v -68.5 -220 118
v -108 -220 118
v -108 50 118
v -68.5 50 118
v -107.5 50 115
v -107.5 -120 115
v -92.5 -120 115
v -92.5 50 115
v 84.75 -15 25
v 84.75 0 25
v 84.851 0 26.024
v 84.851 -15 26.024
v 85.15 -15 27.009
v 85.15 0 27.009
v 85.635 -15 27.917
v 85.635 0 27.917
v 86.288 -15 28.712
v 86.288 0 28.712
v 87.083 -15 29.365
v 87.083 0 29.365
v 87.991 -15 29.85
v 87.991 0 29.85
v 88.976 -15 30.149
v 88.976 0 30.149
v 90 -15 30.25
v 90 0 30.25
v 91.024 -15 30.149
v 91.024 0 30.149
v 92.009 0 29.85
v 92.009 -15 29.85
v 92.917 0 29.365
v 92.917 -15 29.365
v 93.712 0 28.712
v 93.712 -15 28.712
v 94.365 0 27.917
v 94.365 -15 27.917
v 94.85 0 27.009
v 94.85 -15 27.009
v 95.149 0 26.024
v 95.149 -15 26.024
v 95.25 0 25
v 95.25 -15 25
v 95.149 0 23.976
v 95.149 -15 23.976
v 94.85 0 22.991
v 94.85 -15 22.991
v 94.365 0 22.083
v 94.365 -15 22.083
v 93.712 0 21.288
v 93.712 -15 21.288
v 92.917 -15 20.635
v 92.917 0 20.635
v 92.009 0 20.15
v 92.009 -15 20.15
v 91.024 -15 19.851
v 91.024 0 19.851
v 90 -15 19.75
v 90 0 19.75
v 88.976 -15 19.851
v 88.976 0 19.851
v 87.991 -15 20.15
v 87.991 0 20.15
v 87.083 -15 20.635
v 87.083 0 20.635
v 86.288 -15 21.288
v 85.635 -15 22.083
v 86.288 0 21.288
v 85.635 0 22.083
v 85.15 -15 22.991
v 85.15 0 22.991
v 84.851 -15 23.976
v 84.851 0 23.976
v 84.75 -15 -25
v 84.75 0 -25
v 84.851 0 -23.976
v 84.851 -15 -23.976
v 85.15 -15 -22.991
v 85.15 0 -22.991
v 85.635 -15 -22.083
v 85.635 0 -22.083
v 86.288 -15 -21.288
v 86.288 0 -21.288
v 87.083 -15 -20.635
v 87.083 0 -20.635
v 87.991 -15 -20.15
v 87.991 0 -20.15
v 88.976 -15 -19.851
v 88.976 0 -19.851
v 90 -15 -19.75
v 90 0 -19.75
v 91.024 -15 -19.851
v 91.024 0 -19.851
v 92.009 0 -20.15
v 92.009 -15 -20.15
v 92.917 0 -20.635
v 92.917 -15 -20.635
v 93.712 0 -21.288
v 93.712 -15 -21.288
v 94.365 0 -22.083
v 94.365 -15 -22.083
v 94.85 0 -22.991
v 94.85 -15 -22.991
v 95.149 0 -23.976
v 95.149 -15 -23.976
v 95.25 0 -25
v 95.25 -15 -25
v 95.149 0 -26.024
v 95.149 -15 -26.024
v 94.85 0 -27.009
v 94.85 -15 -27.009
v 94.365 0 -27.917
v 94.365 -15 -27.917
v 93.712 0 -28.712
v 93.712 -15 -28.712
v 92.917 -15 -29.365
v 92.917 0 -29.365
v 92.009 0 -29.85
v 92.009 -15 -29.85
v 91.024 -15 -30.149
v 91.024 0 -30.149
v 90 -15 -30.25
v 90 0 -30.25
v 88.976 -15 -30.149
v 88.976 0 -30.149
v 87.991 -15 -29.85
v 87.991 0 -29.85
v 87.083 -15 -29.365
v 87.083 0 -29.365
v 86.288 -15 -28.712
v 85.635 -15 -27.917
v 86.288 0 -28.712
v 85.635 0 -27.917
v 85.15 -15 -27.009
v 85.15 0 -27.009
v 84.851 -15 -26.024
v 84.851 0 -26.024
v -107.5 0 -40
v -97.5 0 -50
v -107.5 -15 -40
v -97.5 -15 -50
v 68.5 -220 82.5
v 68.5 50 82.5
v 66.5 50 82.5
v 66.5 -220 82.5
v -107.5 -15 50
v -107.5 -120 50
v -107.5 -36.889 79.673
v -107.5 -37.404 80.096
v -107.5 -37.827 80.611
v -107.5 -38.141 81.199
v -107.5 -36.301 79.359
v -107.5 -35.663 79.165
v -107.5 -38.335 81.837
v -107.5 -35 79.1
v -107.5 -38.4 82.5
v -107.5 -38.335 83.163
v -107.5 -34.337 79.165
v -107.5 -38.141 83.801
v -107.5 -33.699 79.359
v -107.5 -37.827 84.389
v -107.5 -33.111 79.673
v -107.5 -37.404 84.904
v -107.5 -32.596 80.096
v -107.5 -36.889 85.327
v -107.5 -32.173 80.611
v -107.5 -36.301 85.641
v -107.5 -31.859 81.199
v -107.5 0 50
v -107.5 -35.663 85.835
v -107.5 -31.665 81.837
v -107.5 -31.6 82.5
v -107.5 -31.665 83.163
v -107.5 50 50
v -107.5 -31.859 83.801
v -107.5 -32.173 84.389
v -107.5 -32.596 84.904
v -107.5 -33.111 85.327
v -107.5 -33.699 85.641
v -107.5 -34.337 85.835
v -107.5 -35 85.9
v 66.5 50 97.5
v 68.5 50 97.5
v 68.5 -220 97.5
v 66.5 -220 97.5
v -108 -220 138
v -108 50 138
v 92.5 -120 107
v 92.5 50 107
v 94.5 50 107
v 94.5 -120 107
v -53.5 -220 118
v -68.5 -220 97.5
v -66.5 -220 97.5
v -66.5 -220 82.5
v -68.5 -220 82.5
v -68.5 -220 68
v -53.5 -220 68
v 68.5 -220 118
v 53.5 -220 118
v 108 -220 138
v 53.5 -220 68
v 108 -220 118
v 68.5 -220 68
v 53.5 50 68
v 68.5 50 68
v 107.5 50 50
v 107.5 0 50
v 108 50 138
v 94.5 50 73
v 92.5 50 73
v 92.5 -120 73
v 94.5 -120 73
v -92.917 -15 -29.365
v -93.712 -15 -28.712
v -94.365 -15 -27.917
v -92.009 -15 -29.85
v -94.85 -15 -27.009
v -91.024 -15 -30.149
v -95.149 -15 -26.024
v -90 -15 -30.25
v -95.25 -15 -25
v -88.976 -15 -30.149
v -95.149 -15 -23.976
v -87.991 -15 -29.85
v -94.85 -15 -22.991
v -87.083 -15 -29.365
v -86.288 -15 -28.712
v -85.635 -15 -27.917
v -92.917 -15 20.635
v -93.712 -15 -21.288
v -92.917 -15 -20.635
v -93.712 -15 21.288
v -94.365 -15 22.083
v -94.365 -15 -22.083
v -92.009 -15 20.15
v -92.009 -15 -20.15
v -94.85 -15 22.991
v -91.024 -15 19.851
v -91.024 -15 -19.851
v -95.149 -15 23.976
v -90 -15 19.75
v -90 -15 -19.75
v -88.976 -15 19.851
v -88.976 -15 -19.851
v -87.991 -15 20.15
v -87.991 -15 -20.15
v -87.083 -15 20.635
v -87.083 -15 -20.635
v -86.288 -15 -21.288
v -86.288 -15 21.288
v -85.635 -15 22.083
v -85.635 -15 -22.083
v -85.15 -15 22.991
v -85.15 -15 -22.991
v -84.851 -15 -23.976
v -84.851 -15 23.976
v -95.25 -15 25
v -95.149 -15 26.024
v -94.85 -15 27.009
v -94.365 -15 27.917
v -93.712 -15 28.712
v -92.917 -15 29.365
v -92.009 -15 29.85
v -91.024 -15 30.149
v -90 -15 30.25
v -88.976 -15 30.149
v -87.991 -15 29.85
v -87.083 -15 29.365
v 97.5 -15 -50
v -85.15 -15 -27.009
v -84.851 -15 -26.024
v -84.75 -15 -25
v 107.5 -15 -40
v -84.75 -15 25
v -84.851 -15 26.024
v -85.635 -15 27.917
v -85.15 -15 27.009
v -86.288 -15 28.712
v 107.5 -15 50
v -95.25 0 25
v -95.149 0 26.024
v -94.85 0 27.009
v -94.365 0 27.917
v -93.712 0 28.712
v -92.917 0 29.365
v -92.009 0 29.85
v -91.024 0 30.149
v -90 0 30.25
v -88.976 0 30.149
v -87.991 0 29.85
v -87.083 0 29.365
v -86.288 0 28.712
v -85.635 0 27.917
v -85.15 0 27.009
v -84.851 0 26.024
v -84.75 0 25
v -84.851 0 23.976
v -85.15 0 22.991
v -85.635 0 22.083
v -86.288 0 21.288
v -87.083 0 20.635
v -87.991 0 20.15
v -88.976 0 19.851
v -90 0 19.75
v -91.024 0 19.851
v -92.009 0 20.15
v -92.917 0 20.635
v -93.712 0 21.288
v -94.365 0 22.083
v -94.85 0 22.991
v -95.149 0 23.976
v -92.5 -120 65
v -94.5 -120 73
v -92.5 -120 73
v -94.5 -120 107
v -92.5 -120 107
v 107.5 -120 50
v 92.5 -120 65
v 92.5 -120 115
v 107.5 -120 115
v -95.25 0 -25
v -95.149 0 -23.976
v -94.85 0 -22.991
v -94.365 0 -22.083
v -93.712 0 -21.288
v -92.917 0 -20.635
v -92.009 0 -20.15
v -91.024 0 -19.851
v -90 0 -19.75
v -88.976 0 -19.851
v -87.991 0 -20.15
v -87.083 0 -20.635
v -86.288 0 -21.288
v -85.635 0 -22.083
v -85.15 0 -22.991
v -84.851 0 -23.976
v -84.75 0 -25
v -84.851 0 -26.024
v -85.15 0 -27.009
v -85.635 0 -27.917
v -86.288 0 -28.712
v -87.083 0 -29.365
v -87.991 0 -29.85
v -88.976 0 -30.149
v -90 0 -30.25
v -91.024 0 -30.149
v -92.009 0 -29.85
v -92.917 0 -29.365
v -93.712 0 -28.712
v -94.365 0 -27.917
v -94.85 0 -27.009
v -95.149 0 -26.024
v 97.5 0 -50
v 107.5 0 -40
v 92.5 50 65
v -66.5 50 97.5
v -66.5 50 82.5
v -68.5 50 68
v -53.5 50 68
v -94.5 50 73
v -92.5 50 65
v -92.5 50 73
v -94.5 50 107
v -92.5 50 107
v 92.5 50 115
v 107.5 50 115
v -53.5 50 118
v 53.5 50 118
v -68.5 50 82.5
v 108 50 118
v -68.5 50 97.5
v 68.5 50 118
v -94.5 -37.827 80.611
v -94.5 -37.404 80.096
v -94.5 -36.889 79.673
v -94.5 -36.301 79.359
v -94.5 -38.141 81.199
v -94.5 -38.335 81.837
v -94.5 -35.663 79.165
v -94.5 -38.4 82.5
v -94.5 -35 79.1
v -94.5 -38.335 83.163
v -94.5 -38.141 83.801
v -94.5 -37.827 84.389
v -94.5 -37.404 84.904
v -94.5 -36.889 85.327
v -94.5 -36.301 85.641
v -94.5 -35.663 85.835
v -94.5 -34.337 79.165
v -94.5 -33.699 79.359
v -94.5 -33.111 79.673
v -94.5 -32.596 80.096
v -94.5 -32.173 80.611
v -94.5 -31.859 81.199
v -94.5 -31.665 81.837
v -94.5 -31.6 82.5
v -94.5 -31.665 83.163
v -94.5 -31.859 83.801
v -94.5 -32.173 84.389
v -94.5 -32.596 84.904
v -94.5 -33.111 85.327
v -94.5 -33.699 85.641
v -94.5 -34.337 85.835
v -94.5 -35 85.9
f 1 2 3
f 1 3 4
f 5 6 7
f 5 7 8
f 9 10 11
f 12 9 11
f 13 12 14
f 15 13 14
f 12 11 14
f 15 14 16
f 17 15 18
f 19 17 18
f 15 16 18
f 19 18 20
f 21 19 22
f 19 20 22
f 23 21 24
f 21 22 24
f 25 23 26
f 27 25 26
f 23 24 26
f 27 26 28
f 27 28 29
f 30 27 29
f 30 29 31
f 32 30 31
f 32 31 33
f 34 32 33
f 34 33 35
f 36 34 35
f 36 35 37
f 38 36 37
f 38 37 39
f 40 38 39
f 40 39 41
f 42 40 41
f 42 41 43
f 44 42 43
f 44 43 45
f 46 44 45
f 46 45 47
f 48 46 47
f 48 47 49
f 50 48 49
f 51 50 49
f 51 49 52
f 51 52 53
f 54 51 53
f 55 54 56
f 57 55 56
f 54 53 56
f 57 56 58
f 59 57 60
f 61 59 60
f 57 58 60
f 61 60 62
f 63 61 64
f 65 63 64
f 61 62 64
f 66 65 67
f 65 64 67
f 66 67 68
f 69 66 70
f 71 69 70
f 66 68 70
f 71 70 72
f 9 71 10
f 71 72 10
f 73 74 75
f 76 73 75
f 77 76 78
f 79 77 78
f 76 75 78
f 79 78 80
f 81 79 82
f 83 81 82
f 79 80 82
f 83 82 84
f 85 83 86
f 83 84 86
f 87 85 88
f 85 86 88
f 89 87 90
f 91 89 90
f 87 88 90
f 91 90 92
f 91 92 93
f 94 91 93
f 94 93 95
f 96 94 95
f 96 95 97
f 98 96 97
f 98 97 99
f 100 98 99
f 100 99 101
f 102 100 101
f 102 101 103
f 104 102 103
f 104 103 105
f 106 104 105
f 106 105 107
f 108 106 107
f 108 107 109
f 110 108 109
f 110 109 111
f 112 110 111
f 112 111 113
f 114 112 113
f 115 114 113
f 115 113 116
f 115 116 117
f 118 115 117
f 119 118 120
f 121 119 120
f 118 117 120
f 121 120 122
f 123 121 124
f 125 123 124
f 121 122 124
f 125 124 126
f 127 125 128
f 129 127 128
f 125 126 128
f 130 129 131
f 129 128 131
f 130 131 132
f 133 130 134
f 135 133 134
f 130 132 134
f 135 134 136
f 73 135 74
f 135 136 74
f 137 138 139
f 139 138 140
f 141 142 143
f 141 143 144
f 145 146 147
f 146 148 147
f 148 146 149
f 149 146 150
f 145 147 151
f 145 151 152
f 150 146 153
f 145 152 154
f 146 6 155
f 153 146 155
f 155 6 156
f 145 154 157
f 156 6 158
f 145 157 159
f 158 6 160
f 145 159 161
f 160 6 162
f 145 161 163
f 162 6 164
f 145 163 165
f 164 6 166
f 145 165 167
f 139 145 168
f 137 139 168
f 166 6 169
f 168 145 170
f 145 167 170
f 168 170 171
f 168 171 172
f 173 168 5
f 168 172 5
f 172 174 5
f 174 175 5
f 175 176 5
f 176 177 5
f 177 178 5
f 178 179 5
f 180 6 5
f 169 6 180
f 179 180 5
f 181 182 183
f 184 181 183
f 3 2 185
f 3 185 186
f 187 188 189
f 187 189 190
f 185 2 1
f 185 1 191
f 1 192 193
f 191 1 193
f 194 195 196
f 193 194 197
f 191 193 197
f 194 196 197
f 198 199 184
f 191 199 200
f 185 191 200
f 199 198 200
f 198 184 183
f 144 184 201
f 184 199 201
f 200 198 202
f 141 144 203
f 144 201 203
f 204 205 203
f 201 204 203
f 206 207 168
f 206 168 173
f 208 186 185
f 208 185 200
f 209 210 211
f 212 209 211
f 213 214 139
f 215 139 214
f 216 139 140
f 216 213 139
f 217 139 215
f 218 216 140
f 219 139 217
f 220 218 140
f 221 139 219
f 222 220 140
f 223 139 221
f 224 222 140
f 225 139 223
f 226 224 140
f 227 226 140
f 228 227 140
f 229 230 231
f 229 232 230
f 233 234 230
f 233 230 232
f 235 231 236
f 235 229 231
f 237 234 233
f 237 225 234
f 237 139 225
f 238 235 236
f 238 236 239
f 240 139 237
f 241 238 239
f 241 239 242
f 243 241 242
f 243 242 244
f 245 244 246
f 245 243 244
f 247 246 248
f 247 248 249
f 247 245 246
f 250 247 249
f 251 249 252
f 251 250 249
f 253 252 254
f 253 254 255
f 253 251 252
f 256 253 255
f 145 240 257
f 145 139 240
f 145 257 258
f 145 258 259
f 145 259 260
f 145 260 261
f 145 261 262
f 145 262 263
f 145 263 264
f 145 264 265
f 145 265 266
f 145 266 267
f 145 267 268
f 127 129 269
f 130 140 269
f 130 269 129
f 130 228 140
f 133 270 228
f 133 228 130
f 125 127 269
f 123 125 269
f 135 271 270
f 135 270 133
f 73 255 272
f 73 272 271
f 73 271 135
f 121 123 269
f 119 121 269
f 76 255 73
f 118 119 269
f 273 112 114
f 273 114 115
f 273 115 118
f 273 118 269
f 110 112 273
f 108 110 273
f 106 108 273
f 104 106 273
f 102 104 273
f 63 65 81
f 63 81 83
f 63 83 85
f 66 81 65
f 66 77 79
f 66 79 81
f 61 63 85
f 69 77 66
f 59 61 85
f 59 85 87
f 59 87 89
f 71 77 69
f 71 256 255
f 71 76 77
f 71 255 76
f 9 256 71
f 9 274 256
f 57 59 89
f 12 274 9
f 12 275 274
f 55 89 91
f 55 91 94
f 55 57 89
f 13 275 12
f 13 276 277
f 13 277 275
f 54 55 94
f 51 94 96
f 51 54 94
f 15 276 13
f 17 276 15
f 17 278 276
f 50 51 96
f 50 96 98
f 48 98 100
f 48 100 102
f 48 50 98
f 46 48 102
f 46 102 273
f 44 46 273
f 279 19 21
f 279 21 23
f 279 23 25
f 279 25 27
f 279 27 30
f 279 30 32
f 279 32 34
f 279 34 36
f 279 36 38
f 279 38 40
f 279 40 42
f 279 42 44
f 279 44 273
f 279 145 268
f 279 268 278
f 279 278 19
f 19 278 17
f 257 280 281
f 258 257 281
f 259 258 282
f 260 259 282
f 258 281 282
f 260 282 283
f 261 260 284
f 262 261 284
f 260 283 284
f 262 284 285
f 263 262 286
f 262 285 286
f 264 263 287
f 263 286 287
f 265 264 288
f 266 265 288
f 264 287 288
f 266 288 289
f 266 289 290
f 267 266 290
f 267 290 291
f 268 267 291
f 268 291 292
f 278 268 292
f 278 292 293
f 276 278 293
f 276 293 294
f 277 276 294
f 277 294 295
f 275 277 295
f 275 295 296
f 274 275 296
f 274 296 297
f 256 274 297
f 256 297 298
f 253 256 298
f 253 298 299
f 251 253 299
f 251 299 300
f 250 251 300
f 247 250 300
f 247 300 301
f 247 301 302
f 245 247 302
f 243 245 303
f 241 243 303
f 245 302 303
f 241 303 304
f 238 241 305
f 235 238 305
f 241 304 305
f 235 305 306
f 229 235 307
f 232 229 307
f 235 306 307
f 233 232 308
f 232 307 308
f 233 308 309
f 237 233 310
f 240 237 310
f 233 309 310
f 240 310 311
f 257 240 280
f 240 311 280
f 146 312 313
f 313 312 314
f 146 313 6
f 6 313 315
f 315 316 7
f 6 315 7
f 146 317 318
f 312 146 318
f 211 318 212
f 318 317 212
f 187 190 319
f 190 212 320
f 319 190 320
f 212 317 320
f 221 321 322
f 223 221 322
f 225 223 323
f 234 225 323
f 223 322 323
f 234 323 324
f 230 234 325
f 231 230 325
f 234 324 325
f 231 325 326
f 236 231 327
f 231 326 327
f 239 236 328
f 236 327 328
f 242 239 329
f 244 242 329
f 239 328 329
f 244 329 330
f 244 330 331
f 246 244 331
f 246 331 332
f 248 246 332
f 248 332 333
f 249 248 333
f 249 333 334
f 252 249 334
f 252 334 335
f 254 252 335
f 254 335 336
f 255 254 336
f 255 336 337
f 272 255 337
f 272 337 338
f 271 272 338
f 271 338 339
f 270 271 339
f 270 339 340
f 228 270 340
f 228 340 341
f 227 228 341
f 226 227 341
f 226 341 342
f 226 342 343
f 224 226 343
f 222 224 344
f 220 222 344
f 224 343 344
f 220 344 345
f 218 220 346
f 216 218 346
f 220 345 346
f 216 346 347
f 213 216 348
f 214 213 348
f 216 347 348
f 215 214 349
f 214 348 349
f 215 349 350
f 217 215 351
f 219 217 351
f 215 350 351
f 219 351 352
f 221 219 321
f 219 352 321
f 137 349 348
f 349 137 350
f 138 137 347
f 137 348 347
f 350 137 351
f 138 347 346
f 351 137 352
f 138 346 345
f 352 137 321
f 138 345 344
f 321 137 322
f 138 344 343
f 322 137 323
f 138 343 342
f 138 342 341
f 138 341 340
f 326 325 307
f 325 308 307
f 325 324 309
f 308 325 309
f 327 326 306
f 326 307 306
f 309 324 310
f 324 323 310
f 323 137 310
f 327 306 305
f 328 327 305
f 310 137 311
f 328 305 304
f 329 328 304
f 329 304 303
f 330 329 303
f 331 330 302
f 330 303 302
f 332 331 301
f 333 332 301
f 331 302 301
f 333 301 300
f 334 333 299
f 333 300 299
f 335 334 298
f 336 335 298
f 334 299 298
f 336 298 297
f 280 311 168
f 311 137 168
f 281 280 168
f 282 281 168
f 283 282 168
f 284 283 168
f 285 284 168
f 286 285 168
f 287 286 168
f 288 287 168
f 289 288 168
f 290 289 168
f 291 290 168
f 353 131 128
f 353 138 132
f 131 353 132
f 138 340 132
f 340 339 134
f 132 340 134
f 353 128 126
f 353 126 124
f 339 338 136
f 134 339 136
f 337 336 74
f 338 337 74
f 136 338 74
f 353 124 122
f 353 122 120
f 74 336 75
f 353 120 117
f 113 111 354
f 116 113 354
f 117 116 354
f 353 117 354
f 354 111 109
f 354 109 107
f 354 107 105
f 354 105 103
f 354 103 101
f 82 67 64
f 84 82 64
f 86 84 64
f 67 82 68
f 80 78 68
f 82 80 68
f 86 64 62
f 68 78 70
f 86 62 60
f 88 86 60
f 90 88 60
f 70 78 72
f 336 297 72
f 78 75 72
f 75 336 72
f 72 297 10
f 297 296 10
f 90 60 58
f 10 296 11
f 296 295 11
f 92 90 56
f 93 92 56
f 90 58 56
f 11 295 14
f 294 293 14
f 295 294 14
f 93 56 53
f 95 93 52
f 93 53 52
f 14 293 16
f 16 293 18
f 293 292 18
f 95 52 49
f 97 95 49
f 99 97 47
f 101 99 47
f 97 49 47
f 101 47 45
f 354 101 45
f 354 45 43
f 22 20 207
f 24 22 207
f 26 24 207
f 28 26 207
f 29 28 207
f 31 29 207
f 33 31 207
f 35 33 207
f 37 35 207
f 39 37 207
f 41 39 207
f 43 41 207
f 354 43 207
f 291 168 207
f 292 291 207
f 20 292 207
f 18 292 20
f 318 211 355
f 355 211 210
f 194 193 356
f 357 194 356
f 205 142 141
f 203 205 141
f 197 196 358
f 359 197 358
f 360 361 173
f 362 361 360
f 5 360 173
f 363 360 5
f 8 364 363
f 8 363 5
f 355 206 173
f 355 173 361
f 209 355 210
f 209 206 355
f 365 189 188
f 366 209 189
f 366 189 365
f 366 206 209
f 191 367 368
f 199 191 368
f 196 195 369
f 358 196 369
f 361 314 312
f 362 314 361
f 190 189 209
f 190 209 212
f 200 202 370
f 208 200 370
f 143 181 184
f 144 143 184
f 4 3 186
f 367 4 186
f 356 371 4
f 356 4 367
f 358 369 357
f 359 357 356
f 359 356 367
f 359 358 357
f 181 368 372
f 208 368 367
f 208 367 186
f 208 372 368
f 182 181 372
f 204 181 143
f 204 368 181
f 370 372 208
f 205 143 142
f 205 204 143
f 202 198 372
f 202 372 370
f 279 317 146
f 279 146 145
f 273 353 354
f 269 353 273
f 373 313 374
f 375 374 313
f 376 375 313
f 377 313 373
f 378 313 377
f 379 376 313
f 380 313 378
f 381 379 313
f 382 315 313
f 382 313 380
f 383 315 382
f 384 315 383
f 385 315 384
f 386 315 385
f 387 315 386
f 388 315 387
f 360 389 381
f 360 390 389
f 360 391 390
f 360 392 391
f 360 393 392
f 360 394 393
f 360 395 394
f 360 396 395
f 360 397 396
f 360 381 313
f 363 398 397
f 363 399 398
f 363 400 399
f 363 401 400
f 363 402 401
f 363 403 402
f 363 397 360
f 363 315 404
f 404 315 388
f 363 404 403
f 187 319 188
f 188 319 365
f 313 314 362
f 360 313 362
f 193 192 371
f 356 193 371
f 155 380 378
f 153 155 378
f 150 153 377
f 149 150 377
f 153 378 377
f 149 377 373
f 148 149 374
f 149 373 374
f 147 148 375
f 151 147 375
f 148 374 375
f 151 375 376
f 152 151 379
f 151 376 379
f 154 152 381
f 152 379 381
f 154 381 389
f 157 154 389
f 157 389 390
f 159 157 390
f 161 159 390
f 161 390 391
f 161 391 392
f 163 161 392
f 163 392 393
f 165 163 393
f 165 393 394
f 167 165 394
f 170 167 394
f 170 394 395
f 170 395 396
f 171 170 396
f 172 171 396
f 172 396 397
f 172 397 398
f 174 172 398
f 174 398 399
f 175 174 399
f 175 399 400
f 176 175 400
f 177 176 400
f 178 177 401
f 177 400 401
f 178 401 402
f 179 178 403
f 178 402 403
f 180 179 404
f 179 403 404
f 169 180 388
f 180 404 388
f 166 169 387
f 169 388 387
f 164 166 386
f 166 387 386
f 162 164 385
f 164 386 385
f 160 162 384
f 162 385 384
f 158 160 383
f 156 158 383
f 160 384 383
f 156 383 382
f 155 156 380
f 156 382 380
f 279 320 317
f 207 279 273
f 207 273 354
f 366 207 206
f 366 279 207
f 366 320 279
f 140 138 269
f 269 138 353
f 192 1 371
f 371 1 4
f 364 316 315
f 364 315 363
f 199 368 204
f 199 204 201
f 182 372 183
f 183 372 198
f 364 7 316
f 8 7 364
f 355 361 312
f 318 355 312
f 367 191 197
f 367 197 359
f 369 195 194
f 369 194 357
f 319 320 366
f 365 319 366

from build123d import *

# Parameters (mm, degrees)
F0_W      = 215
F0_H      = 100
F3_DEPTH  = 15
F4_DEPTH  = 215
F5_W      = 170
F5_H      = 50
F6_DEPTH  = 15
F8_W      = 170
F8_H      = 65
F9_DEPTH  = 15
F10_W     = 170
F10_H     = 34
F12_DEPTH = 2
F11_W     = 170
F11_H     = 34
F13_DEPTH = 2
F15_D     = 10.5
F16_SIZE  = 10
F18_W     = 216
F18_H     = 270
F19_DEPTH = 20
F22_W     = 270
F22_H     = 50
F24_DEPTH = 15
F23_W     = 270
F23_H     = 50
F25_DEPTH = 15
F26_W     = 270
F26_H     = 15
F28_DEPTH = 2
F27_W     = 270
F27_H     = 15
F29_DEPTH = 2
F31_D     = 6.8
F31_DEPTH = 25
F31_TIP   = 2.0429261047


with BuildPart() as f3:
    # F0 (on Front) → F3 (new body)
    with BuildSketch(Plane.XZ):
        Rectangle(F0_W, F0_H)
    extrude(amount=F3_DEPTH)

    # F2 (on offset) → F4 (join)
    with BuildSketch(Plane.YZ.offset(107.5)):
        Polygon((50, 65), (0, 65), (-120, 65), (-120, 50), (50, 50), align=None)
    extrude(amount=-F4_DEPTH)

    # F5 (on offset) → F6 (join)
    with BuildSketch(Plane.YZ.offset(107.5)):
        with Locations((-35, 90)):
            Rectangle(F5_W, F5_H)
    extrude(amount=-F6_DEPTH)

    # F8 (on offset) → F9 (join)
    with BuildSketch(Plane.YZ.offset(-107.5)):
        with Locations((-35, 82.5)):
            Rectangle(F8_W, F8_H)
    extrude(amount=F9_DEPTH)

    # F10 (on face) → F12 (cut)
    with BuildSketch(Plane.YZ.offset(-92.5)):
        with Locations((-35, 90)):
            Rectangle(F10_W, F10_H)
    extrude(amount=-F12_DEPTH, mode=Mode.SUBTRACT)

    # F11 (on face) → F13 (cut)
    with BuildSketch(Plane(origin=(92.5, 0, 0), x_dir=(0, -1, 0), z_dir=(-1, 0, 0))):
        with Locations((35, 90)):
            Rectangle(F11_W, F11_H)
    extrude(amount=-F13_DEPTH, mode=Mode.SUBTRACT)

    # F15 (through all)
    with Locations(Plane.XZ.offset(15)):
        with Locations((-90, 25), (-90, -25), (90, -25), (90, 25)):
            Hole(F15_D / 2)

    # F16
    f16_edges = [f3.edges().sort_by_distance(p)[0] for p in [
        (107.5, -7.5, -50),
        (-107.5, -7.5, -50),
    ]]
    chamfer(f16_edges, length=F16_SIZE)

    # F31
    with Locations(Plane(origin=(-107.5, 0, 0), x_dir=(0, 1, 0), z_dir=(-1, 0, 0))):
        with Locations((-35, -82.5)):
            Hole(F31_D / 2, depth=F31_DEPTH)
            with Locations((0, 0, -(F31_DEPTH + F31_TIP / 2))):  # 118° drill point
                Cone(0, F31_D / 2, F31_TIP, mode=Mode.SUBTRACT)


with BuildPart() as f19:
    # F18 (on offset) → F19 (new body)
    with BuildSketch(Plane.XY.offset(118)):
        with Locations((0, -85)):
            Rectangle(F18_W, F18_H)
    extrude(amount=F19_DEPTH)

    # F22 (on offset) → F24 (join)
    with BuildSketch(Plane.YZ.offset(-68.5)):
        with Locations((-85, 93)):
            Rectangle(F22_W, F22_H)
    extrude(amount=F24_DEPTH)

    # F23 (on offset) → F25 (join)
    with BuildSketch(Plane(origin=(68.5, 0, 0), x_dir=(0, -1, 0), z_dir=(-1, 0, 0))):
        with Locations((85, 93)):
            Rectangle(F23_W, F23_H)
    extrude(amount=F25_DEPTH)

    # F26 (on face) → F28 (cut)
    with BuildSketch(Plane(origin=(68.5, 0, 0), x_dir=(0, -1, 0), z_dir=(-1, 0, 0))):
        with Locations((85, 90)):
            Rectangle(F26_W, F26_H)
    extrude(amount=F28_DEPTH, mode=Mode.SUBTRACT)

    # F27 (on offset) → F29 (cut)
    with BuildSketch(Plane.YZ.offset(-68.5)):
        with Locations((-85, 90)):
            Rectangle(F27_W, F27_H)
    extrude(amount=F29_DEPTH, mode=Mode.SUBTRACT)


solid = Compound([f3.part, f19.part])
